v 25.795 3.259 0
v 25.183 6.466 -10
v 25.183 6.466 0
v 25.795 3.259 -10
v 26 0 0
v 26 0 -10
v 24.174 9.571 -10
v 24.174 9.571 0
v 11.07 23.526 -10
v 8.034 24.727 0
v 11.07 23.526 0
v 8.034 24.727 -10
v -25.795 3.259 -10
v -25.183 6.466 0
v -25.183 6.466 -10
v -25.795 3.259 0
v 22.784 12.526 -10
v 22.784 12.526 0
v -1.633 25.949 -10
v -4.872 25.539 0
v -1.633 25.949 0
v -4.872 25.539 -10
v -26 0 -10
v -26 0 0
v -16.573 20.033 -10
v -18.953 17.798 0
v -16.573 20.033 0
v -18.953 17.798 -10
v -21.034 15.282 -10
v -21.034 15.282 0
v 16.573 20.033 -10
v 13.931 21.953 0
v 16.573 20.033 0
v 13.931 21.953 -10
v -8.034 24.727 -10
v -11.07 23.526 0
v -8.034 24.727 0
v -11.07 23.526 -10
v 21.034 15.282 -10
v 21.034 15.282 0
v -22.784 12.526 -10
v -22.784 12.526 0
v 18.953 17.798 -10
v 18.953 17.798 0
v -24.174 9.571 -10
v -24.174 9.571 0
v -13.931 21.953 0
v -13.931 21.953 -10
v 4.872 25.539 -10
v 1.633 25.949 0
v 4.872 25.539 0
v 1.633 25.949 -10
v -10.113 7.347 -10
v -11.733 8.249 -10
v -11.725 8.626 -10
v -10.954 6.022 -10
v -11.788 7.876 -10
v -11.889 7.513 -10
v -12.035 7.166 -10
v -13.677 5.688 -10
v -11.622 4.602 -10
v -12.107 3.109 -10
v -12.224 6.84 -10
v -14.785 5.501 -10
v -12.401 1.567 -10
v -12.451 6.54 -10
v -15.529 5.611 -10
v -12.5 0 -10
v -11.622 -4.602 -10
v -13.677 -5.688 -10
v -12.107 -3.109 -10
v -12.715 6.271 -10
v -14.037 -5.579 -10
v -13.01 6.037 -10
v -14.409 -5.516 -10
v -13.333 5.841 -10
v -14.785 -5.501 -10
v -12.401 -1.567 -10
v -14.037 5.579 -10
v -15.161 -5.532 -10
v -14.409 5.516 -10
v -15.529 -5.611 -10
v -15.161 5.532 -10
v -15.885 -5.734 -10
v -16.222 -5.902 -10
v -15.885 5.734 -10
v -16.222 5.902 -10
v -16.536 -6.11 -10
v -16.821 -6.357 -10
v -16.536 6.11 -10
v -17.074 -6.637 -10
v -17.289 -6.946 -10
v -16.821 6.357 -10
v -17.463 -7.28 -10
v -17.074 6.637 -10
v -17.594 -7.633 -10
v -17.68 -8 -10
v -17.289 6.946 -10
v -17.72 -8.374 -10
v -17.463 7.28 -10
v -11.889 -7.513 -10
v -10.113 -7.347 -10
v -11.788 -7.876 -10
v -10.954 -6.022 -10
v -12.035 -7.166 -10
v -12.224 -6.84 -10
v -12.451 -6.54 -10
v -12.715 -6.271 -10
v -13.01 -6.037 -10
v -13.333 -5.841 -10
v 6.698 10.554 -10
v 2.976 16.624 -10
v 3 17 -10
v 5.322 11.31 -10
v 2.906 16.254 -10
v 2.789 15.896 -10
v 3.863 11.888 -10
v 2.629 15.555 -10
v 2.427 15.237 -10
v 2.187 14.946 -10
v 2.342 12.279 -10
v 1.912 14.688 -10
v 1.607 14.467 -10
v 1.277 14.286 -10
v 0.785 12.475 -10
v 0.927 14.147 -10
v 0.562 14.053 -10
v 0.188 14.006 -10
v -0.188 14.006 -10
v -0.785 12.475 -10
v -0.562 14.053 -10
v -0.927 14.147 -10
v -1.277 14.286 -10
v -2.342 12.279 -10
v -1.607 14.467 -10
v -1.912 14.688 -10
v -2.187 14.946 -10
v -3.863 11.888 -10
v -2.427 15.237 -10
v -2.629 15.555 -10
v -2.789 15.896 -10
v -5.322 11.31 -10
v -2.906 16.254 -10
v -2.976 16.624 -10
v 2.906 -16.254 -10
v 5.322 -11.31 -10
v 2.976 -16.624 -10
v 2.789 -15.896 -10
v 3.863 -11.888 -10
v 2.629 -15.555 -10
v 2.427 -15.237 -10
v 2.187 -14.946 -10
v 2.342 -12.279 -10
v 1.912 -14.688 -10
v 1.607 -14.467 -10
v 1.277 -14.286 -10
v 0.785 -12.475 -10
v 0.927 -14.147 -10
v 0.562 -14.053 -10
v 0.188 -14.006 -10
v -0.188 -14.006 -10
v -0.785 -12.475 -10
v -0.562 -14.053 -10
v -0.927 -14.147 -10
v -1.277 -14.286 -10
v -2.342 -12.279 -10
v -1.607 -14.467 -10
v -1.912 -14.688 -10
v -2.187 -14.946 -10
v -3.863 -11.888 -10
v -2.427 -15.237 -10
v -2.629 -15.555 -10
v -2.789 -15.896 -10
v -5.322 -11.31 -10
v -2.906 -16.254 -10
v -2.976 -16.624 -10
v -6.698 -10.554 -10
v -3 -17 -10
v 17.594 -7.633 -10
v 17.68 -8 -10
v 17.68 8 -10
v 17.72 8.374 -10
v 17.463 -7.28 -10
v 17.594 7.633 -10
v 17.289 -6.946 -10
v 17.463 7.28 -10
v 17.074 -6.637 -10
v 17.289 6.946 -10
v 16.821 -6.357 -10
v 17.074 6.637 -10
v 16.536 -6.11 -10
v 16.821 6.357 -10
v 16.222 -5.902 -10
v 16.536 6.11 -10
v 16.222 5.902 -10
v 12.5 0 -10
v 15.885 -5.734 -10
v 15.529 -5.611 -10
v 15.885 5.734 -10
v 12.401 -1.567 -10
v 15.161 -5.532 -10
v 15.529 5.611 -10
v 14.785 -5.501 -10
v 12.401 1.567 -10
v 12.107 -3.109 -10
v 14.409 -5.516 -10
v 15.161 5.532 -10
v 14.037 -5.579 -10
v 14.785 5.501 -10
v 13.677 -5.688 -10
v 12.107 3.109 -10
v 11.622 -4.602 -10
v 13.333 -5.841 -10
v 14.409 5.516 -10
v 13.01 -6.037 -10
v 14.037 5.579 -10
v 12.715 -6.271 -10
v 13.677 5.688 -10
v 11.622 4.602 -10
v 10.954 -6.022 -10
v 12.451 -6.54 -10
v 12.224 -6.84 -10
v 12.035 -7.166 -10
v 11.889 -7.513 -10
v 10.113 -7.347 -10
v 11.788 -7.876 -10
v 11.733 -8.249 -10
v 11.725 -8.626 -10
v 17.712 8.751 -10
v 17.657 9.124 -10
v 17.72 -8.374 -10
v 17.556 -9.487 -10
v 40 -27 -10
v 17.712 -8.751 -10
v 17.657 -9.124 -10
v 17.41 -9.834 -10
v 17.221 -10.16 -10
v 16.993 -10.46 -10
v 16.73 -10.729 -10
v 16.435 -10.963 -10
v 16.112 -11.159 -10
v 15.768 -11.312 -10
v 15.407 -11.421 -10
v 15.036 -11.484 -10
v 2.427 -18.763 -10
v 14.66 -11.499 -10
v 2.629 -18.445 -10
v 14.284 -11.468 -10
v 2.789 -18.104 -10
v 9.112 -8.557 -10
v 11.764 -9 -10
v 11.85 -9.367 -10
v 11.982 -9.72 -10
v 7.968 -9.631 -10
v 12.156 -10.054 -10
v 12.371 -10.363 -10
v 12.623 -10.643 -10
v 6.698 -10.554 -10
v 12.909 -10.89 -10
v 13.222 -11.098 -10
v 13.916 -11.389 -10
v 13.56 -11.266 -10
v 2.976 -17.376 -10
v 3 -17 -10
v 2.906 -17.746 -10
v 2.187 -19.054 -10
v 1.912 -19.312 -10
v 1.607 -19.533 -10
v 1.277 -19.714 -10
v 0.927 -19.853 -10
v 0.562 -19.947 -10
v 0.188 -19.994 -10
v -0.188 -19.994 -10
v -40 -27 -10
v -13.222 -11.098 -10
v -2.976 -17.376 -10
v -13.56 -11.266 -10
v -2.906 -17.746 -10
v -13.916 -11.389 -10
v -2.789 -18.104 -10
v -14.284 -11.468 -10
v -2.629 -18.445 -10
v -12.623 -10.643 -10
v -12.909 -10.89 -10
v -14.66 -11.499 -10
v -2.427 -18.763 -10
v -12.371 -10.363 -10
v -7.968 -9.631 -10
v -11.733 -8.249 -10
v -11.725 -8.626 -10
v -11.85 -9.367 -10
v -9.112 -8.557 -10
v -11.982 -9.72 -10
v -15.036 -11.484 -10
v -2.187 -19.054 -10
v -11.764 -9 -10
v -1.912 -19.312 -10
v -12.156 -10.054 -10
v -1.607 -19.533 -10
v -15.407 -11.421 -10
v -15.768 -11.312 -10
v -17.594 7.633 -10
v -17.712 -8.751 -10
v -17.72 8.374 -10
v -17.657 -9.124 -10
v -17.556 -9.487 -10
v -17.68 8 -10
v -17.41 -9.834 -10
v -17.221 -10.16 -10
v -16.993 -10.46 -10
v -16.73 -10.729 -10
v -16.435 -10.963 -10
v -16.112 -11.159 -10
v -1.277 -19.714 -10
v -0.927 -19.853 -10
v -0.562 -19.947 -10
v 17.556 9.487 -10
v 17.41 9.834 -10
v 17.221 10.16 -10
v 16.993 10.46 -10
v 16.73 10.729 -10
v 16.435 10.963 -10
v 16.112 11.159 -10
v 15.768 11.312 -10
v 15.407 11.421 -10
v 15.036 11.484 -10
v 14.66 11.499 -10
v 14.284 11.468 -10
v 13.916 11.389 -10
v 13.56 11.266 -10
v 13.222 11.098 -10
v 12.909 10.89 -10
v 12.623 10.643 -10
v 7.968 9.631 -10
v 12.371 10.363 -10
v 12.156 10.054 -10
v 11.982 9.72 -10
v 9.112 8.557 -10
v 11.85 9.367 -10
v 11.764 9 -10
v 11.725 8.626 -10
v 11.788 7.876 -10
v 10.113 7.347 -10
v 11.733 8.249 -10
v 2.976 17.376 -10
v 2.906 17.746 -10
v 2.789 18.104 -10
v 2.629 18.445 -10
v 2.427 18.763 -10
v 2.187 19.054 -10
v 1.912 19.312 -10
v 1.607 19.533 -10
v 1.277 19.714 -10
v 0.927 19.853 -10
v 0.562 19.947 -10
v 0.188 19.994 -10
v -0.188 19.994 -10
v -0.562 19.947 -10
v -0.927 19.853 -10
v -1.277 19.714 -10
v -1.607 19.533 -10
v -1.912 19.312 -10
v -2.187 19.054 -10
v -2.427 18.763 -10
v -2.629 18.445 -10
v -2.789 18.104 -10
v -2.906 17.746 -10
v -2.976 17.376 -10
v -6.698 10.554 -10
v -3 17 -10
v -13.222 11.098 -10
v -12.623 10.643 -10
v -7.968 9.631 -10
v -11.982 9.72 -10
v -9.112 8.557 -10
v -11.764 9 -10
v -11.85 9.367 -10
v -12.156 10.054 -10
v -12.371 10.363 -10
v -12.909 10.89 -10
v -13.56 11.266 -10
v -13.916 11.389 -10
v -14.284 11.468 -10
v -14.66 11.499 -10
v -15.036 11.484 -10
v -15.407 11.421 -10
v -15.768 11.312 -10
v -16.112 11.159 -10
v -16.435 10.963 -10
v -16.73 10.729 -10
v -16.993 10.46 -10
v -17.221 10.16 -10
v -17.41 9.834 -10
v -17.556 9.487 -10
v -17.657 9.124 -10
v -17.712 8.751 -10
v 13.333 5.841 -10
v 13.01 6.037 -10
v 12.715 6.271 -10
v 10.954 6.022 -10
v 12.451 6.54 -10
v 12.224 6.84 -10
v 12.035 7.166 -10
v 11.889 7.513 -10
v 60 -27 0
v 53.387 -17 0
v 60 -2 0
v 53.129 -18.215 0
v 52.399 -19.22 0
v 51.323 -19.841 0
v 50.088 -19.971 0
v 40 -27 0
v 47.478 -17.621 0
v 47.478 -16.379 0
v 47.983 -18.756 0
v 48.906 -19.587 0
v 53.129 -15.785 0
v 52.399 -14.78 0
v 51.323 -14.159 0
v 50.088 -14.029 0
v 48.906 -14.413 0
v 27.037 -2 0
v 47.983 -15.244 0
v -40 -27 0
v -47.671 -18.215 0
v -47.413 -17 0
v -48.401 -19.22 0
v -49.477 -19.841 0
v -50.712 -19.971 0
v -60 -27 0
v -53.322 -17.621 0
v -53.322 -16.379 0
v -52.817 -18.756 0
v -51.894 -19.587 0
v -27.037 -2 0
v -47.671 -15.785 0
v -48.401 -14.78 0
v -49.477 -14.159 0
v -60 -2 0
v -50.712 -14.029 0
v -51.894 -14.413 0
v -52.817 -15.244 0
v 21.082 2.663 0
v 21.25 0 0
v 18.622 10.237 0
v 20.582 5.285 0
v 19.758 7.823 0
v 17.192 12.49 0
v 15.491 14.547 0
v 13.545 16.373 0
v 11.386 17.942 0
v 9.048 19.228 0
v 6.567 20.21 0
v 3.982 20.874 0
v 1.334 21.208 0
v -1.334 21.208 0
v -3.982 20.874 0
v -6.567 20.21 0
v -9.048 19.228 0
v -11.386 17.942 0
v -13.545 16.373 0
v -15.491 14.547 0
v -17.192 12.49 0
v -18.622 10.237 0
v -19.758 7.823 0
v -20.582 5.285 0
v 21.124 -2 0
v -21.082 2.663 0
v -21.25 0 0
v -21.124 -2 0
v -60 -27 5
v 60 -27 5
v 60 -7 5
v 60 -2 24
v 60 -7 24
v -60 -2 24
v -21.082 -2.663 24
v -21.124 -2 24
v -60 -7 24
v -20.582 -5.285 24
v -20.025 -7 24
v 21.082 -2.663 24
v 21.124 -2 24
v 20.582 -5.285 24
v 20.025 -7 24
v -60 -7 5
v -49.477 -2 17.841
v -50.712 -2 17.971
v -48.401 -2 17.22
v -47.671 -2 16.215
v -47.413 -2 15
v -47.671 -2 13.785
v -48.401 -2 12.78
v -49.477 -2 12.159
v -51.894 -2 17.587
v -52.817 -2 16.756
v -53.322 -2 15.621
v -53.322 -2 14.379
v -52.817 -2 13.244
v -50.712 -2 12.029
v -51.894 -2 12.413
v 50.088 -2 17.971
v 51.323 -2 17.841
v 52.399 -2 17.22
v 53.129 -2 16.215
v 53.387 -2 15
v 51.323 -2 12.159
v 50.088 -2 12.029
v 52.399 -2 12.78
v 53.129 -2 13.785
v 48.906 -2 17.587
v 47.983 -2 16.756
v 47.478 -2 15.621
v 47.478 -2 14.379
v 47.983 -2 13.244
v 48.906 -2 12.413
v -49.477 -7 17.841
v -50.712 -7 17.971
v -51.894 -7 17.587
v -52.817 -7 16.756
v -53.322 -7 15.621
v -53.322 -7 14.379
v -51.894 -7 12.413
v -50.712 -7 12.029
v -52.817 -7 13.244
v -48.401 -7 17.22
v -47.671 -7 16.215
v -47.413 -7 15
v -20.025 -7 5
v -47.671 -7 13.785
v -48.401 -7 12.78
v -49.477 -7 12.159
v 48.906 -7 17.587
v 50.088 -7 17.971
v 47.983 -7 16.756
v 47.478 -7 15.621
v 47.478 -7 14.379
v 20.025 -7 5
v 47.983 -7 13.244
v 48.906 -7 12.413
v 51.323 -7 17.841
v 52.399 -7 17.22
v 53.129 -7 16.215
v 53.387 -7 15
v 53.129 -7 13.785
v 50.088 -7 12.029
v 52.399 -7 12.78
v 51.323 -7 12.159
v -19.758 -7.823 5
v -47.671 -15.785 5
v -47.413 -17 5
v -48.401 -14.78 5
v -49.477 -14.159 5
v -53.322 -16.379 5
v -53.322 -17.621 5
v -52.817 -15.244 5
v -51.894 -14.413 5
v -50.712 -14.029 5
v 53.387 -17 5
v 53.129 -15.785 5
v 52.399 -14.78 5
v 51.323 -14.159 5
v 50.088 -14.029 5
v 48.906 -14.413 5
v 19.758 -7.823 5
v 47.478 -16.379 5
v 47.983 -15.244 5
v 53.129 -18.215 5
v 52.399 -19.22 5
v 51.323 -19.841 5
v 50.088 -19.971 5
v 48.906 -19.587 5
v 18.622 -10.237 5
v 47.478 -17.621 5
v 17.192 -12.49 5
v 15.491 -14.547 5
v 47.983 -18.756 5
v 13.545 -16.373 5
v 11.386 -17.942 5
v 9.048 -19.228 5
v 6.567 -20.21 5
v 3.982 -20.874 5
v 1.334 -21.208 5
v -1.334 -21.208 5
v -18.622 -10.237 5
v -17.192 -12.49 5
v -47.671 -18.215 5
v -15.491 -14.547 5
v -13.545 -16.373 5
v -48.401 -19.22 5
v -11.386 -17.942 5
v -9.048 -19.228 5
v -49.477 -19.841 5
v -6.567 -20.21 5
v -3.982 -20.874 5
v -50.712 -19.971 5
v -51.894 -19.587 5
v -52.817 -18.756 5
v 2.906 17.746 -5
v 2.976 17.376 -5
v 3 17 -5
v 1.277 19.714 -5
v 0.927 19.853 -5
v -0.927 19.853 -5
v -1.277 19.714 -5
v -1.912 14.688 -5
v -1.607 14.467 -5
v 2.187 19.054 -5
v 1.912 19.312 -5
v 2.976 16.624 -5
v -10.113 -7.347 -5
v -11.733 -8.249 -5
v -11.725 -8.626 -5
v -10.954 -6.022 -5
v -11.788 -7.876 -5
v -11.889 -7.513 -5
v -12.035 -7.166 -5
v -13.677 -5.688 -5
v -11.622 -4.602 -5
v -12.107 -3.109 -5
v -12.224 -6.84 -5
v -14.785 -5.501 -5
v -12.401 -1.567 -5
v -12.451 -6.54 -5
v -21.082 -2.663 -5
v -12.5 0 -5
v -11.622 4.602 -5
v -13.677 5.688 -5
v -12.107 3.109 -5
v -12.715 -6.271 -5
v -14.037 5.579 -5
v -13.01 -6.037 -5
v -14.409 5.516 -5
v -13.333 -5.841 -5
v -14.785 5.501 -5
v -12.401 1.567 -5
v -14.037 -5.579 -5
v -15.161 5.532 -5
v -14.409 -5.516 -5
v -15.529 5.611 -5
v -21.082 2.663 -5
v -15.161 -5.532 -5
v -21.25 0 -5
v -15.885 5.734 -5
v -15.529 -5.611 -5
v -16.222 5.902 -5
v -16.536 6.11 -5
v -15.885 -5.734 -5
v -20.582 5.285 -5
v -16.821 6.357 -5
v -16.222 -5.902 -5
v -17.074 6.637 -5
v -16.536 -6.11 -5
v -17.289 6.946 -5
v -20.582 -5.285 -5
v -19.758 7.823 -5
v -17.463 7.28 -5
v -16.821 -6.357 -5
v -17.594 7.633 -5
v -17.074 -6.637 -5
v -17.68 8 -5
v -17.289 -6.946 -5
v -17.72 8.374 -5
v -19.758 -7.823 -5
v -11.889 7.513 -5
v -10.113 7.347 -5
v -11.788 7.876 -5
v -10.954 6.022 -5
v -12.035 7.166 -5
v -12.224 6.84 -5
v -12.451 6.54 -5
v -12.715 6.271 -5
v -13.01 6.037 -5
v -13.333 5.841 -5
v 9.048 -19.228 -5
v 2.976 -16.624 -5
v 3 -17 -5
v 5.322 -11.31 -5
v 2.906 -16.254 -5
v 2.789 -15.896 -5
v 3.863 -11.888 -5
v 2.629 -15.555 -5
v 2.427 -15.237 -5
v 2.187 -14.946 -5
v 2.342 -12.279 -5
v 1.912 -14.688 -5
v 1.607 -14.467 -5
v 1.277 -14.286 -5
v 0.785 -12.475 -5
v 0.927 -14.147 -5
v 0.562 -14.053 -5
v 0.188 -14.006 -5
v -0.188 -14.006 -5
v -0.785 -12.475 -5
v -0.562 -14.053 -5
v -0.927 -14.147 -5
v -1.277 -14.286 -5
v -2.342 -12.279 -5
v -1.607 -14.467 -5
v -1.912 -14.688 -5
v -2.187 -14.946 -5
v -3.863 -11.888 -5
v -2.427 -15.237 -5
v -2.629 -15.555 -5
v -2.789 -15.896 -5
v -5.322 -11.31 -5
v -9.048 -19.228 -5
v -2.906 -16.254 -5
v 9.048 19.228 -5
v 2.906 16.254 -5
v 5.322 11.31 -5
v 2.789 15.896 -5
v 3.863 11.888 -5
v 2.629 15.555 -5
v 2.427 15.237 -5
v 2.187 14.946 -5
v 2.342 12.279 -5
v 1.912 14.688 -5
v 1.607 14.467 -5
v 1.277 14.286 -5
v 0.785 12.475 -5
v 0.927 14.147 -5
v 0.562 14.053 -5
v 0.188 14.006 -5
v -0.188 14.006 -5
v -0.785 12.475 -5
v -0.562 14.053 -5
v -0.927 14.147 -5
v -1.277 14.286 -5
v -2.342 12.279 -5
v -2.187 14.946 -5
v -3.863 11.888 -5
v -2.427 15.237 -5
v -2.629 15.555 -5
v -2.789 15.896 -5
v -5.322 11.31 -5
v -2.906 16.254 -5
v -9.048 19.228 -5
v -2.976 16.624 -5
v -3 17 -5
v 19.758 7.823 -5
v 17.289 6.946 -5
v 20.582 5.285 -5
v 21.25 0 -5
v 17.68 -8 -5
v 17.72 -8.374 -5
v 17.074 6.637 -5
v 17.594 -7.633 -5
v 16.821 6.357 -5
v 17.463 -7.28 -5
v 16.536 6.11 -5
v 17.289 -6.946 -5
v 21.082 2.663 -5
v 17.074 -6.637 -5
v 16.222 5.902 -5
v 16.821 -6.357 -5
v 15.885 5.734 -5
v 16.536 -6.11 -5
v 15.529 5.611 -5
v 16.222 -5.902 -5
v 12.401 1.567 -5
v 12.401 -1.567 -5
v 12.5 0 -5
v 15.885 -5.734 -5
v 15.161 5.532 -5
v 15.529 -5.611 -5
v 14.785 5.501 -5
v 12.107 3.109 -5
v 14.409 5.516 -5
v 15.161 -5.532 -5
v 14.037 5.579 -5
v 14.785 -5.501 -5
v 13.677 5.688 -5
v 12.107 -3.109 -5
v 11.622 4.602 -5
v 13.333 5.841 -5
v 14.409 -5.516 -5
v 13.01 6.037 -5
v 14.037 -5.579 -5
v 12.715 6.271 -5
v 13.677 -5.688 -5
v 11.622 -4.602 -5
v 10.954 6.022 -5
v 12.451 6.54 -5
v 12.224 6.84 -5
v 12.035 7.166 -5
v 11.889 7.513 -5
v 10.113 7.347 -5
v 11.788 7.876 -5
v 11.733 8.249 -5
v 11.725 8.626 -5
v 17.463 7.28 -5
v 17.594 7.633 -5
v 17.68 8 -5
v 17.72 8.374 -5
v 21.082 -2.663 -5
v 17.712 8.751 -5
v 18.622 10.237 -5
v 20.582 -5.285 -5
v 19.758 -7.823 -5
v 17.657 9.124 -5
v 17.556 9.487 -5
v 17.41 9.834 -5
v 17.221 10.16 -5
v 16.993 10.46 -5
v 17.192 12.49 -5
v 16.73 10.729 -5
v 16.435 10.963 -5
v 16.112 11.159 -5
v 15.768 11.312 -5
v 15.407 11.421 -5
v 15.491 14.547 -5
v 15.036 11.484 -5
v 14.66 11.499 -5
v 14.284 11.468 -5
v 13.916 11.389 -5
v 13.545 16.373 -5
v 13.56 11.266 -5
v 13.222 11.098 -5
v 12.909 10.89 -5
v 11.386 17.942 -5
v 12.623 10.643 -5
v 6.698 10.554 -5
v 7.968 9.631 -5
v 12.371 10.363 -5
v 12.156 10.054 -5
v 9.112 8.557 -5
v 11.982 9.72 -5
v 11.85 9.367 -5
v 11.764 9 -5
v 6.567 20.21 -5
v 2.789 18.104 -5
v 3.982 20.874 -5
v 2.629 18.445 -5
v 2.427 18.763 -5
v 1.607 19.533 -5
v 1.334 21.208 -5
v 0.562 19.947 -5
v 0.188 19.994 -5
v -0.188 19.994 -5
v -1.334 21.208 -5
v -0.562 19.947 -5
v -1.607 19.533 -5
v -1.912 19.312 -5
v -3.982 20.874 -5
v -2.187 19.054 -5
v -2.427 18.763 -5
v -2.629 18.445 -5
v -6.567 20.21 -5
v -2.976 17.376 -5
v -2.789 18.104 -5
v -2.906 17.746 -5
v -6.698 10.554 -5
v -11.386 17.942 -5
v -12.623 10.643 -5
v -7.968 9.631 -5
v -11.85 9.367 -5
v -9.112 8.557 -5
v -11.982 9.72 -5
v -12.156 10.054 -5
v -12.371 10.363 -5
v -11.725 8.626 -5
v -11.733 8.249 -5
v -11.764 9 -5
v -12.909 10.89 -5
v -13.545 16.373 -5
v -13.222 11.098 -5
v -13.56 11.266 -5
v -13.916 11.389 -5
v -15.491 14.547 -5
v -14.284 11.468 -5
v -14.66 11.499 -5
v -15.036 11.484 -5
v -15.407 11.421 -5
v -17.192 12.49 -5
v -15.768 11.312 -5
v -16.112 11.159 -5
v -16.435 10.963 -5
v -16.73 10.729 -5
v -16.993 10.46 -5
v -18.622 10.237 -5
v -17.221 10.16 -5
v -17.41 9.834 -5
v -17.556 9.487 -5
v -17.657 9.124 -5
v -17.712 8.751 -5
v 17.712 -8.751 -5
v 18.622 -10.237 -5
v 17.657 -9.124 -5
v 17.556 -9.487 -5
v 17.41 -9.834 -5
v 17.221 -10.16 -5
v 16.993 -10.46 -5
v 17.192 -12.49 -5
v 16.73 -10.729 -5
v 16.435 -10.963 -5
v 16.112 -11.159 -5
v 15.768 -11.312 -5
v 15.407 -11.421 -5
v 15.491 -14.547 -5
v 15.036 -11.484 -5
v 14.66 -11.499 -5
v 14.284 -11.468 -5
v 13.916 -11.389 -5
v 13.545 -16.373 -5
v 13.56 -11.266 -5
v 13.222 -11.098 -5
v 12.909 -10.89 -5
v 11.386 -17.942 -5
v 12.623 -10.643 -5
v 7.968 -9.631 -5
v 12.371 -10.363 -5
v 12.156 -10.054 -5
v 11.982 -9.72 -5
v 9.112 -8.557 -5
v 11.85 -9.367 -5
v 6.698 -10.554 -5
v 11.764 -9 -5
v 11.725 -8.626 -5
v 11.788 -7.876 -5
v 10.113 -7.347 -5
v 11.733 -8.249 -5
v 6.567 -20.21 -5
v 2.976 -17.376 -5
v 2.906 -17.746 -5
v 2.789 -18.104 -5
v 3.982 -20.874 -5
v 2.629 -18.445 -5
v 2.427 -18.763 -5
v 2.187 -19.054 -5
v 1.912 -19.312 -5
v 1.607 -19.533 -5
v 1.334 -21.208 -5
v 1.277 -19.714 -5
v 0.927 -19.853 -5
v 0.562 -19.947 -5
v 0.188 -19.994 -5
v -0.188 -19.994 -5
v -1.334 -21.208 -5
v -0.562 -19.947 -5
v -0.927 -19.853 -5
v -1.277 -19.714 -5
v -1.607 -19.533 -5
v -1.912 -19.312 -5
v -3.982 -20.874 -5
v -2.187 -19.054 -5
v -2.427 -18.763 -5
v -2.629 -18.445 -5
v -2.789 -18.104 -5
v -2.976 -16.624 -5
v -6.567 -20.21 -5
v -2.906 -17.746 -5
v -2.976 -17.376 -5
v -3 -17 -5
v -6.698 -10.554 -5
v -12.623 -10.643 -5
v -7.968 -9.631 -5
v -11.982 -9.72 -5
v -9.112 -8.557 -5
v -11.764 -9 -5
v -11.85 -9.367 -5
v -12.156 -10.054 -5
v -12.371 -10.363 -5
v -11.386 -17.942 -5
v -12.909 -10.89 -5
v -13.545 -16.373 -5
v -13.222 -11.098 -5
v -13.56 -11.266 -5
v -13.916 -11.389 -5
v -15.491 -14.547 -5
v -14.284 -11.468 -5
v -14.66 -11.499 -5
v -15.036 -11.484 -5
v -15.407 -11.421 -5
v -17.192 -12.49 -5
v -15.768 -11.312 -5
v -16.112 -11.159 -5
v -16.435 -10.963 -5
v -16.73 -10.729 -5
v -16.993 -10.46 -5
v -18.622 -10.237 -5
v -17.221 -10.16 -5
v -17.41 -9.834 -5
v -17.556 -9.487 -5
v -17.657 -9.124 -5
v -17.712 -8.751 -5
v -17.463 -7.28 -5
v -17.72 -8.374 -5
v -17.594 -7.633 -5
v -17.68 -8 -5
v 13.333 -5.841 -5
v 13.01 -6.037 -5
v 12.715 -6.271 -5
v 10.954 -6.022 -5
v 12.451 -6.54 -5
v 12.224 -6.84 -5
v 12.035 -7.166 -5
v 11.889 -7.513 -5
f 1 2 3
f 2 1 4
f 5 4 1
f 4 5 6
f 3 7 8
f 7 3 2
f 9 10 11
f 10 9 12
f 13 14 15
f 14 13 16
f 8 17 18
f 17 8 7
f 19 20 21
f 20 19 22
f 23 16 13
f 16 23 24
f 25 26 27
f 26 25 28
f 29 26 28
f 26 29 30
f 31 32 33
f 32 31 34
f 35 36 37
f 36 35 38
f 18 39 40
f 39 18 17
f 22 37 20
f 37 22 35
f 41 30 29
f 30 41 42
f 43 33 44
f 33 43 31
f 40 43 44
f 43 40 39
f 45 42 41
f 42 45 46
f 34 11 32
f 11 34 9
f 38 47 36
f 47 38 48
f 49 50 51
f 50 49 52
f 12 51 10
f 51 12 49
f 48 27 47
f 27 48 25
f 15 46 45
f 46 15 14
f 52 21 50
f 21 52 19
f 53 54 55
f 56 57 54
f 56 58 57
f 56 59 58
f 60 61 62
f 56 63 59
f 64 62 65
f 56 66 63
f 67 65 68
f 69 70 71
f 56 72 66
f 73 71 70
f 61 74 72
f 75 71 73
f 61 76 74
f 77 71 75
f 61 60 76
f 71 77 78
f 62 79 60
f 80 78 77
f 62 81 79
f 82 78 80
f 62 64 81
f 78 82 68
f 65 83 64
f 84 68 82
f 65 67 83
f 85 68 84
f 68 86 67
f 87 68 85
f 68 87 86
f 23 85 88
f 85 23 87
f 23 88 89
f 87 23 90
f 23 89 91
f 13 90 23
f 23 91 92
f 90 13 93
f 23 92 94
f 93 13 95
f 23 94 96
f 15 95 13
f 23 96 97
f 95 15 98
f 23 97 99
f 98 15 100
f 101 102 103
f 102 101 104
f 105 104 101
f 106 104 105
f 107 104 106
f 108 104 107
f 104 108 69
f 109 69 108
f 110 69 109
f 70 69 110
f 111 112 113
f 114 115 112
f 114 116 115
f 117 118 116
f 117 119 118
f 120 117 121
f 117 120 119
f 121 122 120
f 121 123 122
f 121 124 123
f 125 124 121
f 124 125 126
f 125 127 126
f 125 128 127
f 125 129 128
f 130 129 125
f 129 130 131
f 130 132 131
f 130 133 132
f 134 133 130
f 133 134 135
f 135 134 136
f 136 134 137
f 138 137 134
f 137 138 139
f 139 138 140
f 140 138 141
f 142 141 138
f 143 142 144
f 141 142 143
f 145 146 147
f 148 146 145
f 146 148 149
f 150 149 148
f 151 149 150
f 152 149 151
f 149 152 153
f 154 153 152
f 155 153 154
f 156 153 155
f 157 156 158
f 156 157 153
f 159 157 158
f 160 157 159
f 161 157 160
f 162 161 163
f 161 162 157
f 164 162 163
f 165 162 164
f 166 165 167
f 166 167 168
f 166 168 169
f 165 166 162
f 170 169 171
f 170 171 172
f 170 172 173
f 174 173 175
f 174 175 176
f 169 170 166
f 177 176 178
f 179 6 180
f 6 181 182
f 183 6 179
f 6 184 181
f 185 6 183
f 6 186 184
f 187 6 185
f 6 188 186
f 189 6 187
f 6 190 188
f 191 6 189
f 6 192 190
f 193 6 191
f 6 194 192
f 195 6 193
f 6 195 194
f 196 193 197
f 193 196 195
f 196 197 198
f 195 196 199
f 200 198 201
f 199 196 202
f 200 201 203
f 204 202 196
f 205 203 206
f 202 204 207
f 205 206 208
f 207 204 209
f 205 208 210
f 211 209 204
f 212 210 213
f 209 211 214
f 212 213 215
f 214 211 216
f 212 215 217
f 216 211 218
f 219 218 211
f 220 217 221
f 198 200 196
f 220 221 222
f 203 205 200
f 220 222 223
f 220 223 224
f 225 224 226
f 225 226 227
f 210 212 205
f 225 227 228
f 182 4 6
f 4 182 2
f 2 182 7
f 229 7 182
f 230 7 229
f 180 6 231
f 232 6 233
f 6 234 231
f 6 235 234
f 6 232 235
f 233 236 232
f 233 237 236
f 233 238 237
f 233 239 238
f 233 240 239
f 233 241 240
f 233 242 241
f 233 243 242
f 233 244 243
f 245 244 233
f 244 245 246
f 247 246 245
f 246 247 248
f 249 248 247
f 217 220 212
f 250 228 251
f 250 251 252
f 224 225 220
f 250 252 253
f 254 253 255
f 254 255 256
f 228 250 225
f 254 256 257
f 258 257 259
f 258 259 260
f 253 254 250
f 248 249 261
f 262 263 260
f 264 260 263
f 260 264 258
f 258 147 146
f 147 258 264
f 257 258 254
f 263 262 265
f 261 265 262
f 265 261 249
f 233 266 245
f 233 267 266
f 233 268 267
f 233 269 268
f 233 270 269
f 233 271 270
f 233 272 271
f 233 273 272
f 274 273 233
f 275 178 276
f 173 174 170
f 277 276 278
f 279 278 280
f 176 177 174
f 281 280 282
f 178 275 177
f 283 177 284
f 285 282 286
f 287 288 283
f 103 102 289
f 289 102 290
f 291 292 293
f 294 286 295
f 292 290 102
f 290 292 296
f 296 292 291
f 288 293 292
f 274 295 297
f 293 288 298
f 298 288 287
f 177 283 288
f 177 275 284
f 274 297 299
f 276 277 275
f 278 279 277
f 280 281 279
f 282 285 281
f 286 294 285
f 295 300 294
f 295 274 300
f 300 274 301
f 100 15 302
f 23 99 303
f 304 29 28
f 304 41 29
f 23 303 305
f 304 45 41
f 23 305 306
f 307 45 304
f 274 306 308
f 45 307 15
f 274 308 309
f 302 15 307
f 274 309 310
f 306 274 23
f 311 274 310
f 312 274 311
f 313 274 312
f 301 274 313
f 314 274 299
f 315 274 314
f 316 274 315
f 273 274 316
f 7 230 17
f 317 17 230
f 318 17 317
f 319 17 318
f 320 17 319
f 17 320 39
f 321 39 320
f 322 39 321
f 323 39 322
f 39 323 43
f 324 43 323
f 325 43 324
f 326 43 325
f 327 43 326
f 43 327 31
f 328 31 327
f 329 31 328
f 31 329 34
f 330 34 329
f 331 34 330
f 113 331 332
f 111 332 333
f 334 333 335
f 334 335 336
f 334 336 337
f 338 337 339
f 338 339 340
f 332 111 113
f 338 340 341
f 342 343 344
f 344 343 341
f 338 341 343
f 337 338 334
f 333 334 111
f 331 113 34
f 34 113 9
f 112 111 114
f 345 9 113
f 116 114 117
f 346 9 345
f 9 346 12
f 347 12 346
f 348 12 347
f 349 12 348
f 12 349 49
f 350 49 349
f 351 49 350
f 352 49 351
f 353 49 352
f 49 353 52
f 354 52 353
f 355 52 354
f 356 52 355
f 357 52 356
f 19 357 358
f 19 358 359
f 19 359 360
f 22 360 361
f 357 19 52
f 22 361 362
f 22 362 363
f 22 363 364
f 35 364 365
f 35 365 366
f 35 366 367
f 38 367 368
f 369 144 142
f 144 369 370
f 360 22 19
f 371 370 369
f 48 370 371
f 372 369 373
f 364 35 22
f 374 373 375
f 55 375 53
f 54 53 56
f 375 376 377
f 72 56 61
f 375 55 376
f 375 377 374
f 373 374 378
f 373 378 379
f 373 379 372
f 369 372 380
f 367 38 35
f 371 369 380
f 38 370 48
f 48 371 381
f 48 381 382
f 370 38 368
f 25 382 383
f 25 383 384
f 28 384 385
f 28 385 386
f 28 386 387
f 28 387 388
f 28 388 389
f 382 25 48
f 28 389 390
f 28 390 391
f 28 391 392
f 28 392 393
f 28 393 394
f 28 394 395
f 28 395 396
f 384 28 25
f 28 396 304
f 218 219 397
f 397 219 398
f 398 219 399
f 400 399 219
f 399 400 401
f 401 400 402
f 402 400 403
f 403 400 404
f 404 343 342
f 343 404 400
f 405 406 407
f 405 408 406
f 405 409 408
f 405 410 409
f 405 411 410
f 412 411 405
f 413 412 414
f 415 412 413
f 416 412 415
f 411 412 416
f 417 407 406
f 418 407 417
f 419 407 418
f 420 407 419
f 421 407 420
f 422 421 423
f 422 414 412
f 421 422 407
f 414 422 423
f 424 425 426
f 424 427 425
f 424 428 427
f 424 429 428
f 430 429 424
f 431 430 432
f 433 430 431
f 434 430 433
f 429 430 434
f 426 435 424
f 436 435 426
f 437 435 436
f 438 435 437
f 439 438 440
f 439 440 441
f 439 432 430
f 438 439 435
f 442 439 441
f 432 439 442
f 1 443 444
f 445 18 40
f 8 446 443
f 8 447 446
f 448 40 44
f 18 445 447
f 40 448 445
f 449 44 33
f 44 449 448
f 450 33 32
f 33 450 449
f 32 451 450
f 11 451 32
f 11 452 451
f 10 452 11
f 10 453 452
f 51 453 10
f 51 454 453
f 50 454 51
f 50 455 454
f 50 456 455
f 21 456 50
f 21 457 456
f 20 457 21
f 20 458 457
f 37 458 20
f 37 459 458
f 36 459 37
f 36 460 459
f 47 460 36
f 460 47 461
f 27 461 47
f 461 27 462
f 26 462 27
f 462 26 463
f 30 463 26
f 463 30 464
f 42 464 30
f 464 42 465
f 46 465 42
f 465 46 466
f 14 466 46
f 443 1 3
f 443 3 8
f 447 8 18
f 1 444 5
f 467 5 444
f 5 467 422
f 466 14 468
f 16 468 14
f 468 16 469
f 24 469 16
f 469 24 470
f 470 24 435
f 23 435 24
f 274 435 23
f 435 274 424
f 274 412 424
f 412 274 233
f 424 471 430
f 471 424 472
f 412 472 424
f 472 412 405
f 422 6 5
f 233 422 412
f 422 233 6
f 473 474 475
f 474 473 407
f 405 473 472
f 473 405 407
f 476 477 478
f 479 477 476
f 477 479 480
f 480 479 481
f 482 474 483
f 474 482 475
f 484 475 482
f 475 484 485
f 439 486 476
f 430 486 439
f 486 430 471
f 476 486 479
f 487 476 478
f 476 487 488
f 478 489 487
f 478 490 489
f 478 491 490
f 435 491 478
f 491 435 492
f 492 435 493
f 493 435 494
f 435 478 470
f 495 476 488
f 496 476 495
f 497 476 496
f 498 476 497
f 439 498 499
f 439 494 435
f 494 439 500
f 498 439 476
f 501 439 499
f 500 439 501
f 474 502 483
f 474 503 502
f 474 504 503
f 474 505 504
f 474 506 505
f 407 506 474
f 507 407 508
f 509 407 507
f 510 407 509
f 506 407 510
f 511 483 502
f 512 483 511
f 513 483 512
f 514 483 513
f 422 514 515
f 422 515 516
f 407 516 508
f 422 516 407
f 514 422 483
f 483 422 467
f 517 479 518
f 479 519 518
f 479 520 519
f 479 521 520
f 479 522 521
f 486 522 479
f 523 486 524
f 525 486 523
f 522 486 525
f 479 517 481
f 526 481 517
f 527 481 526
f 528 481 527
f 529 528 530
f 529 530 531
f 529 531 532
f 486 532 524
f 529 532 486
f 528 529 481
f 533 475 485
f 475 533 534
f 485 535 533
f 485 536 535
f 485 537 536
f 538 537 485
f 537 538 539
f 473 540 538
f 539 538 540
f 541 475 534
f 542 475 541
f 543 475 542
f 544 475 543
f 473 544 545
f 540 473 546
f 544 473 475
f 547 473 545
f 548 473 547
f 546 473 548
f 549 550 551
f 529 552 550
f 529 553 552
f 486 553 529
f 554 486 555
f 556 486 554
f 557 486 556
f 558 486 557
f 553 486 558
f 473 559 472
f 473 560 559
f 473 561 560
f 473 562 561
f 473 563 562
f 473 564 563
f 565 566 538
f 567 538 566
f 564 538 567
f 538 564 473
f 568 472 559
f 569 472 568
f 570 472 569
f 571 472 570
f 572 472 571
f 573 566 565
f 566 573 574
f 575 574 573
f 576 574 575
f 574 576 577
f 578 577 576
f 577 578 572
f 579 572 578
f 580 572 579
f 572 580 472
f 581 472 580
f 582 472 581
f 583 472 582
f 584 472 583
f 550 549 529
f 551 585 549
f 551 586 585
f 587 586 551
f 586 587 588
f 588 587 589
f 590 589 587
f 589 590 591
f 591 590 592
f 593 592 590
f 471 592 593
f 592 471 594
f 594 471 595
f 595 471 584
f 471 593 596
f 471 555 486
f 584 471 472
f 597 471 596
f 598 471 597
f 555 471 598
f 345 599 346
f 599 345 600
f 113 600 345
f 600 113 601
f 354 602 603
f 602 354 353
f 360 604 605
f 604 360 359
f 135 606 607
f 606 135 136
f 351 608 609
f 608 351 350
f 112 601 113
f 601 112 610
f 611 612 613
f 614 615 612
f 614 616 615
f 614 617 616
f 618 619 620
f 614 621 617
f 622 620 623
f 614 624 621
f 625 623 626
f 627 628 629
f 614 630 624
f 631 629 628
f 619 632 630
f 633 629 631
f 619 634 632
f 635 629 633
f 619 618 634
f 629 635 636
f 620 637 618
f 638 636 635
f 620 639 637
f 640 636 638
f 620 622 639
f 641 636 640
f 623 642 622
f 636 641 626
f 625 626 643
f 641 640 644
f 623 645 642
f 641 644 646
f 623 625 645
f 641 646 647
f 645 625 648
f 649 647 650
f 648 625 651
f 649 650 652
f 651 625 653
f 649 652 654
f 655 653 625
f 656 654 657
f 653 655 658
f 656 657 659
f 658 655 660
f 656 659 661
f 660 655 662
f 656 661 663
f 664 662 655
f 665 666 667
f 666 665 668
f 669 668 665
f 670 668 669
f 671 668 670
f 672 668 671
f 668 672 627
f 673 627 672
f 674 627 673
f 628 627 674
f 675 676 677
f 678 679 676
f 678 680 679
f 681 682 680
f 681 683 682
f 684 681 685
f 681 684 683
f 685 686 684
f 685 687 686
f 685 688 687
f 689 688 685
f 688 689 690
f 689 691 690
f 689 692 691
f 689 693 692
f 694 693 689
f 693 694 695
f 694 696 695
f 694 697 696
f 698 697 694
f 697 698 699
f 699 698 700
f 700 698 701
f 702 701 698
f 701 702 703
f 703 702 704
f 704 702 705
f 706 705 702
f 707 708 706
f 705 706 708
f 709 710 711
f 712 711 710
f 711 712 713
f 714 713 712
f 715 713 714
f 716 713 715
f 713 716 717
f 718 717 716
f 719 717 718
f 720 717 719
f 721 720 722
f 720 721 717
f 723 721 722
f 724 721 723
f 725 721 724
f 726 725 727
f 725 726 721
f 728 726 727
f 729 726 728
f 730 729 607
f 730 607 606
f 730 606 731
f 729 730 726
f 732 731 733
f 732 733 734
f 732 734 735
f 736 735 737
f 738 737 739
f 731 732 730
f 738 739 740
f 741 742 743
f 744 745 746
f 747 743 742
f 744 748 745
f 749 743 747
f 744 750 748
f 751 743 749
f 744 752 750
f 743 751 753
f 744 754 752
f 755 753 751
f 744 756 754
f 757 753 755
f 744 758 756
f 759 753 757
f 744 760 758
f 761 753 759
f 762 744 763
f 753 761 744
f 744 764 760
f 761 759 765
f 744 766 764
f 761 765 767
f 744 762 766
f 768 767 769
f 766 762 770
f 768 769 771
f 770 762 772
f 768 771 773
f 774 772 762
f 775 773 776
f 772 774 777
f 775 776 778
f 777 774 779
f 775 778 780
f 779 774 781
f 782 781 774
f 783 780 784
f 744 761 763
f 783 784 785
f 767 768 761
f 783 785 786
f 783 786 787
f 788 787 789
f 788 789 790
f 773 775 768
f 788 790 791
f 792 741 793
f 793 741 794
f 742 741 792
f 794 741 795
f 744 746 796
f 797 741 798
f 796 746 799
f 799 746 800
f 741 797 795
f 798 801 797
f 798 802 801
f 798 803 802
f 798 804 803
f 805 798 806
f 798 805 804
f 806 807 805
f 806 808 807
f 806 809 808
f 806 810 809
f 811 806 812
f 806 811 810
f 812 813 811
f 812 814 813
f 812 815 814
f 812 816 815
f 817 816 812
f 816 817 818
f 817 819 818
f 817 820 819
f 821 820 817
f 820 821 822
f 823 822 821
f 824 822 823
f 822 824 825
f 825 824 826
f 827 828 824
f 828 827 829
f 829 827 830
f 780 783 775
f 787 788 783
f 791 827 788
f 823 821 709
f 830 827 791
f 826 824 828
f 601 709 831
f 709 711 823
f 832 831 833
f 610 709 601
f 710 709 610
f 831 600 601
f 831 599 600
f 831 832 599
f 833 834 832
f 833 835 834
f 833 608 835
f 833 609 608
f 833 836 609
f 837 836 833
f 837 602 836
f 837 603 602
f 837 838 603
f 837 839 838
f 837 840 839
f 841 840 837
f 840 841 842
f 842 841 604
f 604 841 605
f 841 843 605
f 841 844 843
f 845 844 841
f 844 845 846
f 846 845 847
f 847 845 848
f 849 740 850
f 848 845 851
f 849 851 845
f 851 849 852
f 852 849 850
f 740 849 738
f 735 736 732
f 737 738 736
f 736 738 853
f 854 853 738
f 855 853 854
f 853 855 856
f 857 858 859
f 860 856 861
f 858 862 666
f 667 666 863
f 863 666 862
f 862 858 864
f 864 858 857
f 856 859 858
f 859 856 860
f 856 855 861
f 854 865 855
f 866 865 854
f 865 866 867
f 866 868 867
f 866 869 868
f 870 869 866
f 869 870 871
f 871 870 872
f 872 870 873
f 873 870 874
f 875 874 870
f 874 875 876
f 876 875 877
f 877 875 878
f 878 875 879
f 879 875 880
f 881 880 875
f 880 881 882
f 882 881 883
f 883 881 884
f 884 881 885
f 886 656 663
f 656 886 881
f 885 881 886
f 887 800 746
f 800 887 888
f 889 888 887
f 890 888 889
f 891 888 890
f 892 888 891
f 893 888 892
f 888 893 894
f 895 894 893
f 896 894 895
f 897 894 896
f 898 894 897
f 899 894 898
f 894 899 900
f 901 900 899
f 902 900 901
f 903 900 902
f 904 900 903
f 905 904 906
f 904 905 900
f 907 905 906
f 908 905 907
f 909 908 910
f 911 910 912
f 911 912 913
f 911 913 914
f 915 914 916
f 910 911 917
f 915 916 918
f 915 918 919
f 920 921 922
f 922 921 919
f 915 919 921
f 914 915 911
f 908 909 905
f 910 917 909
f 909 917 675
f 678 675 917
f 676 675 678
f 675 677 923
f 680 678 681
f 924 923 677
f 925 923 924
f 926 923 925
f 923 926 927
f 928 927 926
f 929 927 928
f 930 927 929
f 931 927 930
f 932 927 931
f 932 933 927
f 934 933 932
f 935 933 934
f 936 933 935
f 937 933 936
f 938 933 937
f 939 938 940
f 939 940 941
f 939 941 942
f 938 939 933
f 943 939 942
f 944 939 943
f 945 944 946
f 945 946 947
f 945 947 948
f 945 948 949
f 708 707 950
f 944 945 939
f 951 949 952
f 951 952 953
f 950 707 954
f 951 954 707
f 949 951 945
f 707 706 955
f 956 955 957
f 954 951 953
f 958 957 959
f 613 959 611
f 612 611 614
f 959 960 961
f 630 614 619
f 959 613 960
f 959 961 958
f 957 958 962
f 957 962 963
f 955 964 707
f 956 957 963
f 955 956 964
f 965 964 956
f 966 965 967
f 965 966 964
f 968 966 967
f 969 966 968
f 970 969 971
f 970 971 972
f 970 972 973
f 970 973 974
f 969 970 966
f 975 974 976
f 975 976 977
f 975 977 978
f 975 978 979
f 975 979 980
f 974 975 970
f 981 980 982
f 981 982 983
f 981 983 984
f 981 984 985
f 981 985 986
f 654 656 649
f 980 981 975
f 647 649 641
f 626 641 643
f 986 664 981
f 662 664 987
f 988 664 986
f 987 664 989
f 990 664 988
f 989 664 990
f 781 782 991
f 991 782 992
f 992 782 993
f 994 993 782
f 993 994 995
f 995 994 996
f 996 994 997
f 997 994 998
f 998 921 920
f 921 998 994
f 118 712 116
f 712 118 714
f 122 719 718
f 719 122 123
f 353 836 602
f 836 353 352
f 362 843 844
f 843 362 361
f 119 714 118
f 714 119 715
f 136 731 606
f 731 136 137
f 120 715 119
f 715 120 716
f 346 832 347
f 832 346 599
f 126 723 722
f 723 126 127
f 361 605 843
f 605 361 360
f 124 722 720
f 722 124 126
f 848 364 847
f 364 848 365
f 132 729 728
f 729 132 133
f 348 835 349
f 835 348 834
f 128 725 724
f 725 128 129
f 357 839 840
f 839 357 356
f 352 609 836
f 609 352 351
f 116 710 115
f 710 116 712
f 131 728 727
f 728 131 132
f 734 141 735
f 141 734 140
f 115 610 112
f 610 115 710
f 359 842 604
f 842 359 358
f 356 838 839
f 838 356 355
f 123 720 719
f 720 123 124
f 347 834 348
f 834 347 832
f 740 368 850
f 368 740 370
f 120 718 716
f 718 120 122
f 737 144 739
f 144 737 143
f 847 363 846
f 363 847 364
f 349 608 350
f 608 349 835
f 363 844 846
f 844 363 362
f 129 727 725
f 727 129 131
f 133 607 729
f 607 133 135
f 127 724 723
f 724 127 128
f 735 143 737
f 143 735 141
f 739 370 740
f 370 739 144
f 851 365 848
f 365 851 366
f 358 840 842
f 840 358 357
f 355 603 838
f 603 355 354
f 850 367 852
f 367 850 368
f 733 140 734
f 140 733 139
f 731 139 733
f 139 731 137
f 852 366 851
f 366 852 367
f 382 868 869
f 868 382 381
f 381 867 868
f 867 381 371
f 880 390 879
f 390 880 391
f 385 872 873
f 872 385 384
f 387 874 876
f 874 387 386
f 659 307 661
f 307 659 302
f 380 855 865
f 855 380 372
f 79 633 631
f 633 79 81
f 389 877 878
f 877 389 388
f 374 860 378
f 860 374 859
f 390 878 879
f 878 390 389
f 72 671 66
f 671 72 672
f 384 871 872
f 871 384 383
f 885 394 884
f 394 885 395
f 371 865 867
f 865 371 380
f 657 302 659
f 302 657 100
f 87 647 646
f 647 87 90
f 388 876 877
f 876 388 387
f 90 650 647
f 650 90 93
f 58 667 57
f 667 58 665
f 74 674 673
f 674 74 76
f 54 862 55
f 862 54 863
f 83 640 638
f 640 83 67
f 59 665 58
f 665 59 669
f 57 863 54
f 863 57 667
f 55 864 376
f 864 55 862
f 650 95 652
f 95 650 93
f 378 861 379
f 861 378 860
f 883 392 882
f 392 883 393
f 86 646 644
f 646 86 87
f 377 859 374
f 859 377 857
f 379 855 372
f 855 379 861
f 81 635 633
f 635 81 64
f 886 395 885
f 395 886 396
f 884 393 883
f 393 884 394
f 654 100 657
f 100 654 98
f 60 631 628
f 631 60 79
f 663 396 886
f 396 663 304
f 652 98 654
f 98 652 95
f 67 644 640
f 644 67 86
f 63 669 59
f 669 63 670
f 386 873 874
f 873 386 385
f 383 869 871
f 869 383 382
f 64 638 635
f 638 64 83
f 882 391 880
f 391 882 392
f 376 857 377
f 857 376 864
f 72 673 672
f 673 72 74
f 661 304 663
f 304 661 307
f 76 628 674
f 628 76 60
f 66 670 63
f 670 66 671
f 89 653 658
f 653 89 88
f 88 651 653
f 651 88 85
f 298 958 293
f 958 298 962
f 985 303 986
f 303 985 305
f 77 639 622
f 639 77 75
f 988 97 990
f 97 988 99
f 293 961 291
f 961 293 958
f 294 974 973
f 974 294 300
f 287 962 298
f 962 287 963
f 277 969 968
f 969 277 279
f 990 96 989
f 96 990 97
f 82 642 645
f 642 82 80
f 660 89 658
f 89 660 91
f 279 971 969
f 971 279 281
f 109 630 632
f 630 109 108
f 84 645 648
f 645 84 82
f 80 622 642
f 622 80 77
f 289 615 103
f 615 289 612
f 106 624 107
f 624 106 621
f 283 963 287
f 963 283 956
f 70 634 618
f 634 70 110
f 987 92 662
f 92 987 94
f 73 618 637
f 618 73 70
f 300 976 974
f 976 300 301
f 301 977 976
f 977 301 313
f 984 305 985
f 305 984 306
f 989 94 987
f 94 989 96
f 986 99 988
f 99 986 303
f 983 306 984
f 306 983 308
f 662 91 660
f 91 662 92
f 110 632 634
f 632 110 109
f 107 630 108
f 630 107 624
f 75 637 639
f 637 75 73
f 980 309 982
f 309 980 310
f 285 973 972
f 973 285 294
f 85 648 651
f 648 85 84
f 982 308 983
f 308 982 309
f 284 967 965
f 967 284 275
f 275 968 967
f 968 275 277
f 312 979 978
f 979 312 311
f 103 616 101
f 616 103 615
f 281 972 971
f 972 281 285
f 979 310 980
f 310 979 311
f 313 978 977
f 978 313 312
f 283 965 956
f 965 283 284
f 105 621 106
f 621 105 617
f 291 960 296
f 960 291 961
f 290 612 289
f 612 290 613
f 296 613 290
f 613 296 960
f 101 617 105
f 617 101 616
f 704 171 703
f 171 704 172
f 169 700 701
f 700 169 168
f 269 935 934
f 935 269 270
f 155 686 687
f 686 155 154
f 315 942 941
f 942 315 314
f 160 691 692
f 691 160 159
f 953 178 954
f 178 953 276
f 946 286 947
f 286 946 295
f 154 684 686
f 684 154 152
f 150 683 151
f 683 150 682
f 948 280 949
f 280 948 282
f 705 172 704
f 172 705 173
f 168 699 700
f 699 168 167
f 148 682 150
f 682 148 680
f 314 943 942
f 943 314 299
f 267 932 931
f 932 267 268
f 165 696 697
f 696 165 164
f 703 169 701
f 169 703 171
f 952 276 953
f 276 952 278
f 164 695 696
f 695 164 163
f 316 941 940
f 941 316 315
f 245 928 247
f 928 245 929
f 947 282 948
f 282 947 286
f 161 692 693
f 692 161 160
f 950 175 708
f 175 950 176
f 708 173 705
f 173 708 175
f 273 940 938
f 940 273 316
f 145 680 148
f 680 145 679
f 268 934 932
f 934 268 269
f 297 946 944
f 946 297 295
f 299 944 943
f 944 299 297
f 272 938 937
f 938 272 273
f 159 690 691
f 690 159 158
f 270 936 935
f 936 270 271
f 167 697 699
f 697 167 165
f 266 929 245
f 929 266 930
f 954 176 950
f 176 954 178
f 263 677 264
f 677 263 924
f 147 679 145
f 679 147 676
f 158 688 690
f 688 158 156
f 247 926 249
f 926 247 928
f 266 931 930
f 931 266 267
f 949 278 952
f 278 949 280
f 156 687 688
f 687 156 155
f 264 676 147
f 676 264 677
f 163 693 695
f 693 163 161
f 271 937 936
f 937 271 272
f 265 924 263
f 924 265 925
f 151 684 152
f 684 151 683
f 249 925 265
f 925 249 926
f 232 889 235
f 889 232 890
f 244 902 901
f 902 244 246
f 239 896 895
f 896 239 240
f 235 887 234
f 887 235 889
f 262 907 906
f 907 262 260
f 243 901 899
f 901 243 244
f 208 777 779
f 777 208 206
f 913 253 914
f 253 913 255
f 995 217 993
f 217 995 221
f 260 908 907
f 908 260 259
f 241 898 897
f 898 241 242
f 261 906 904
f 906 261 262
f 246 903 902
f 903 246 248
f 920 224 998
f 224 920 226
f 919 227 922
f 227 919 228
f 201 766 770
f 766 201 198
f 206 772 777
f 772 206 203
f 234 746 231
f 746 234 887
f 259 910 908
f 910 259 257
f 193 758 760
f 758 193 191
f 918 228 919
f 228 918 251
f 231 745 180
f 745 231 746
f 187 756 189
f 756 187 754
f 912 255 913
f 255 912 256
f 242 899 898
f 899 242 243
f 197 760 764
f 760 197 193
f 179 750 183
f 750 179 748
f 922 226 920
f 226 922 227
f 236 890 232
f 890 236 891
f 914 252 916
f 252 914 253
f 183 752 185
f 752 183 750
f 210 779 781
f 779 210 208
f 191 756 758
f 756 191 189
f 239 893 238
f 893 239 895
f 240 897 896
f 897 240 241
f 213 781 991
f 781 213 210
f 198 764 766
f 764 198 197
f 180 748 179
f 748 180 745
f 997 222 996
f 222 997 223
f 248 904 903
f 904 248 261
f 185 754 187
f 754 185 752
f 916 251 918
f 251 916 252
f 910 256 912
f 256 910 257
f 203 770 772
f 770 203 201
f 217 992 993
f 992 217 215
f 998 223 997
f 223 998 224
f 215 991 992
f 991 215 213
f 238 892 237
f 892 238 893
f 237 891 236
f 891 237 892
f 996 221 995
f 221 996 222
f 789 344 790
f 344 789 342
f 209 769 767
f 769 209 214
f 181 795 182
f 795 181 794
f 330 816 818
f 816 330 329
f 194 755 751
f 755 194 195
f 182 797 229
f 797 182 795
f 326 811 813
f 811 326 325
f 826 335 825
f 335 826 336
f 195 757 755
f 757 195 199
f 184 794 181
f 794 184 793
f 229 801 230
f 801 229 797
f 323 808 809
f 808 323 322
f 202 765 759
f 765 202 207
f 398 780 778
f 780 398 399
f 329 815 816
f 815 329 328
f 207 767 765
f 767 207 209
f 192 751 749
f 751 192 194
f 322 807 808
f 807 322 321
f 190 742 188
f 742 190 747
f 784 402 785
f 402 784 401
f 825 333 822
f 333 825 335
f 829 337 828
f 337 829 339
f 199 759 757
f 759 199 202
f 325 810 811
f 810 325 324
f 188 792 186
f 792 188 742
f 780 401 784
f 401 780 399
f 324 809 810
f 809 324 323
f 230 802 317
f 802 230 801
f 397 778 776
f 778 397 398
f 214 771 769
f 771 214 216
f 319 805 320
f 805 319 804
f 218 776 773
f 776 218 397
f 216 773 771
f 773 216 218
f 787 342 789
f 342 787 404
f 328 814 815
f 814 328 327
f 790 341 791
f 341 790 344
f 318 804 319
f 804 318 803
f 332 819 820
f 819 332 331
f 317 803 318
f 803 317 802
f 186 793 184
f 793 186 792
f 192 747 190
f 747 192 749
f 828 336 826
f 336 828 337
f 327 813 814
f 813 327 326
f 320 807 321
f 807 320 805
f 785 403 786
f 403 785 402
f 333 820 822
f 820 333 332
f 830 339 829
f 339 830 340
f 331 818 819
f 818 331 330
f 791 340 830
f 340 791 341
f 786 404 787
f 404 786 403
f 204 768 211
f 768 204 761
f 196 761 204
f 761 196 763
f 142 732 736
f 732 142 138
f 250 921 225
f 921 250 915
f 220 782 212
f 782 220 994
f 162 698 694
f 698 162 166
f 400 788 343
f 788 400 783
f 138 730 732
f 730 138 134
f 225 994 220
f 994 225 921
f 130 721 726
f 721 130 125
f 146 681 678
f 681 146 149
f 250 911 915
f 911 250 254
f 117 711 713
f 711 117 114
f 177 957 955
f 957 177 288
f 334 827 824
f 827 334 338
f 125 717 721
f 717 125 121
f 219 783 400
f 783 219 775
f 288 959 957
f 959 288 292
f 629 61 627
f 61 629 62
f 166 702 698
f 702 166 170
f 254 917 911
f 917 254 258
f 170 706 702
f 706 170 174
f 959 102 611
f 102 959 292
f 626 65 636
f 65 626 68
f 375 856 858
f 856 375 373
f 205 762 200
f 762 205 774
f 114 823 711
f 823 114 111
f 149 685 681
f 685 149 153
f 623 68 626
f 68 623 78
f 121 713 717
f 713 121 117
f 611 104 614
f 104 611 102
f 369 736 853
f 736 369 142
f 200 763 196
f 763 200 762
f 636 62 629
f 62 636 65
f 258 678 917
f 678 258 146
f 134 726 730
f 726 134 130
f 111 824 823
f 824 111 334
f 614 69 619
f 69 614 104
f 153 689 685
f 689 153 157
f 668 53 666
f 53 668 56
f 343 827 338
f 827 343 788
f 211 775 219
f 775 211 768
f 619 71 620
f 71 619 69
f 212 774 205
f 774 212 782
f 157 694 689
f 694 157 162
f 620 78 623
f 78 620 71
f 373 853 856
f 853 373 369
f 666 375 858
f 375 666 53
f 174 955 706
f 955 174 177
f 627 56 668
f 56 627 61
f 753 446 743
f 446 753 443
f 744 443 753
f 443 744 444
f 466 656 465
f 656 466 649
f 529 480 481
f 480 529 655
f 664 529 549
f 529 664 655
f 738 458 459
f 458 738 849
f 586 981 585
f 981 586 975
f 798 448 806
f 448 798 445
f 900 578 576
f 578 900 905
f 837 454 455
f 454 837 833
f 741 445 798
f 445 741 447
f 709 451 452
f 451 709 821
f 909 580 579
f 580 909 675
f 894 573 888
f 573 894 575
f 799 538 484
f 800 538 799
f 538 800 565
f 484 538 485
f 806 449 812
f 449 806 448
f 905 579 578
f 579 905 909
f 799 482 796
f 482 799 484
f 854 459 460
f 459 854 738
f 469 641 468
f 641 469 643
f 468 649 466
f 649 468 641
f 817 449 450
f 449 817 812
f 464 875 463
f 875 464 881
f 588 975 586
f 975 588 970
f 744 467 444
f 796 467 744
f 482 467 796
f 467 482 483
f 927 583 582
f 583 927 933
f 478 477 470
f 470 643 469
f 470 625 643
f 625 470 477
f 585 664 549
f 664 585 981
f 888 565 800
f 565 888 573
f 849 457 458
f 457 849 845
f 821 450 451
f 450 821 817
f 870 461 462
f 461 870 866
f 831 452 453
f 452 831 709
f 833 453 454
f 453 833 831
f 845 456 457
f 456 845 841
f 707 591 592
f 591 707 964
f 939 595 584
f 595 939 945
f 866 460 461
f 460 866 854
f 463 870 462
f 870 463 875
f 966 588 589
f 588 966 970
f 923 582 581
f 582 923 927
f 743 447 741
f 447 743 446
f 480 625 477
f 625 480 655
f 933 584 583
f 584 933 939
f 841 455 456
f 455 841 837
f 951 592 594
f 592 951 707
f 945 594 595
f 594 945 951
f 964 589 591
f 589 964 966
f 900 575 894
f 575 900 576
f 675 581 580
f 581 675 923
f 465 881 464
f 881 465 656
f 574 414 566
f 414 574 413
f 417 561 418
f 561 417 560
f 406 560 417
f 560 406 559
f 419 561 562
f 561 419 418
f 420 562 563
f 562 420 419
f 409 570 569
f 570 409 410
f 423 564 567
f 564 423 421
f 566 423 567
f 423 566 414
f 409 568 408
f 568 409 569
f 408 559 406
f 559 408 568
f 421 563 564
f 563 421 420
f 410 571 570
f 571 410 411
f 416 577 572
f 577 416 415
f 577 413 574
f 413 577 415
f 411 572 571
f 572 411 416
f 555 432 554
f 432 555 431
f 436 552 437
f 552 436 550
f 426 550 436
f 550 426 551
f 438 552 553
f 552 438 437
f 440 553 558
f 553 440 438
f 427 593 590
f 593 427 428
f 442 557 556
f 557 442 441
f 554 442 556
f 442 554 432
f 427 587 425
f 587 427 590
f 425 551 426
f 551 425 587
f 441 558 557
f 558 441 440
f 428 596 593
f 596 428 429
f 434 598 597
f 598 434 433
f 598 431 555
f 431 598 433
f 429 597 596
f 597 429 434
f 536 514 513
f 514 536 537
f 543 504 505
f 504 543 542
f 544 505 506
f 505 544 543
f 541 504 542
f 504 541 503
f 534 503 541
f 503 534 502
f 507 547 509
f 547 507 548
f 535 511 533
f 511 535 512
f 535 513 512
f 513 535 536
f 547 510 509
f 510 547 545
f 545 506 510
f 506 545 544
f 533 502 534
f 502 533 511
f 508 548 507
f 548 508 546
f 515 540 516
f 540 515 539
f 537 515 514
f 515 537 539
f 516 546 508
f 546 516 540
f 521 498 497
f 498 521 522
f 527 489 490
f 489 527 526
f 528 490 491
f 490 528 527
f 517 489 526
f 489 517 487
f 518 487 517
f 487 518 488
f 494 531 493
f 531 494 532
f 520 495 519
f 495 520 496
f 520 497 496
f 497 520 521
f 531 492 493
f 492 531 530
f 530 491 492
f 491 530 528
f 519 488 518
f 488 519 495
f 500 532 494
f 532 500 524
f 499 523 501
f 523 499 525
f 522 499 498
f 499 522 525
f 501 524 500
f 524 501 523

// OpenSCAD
// file: nuts_and_bolts.scad
// Copyright 2010 D1plo1d

// This library is dual licensed under the GPL 3.0 and the GNU Lesser General Public License as per http://creativecommons.org/licenses/LGPL/2.1/ .

//testNutsAndBolts();

module SKIPtestNutsAndBolts()
{
	$fn = 360;
	translate([0,15])nutHole(3);
	boltHole(3, length= 30);
}

MM = "mm";
INCH = "inch"; //Not yet supported

//Based on: http://www.roymech.co.uk/Useful_Tables/Screws/Hex_Screws.htm
METRIC_NUT_AC_WIDTHS =
[
	-1, //0 index is not used but reduces computation
	-1,
	-1,
	6.90,//m3
	8.10,//m4
	9.20,//m5
	11.50,//m6
	-1,
	15.50,//m8
	-1,
	19.60,//m10
	-1,
	22.10,//m12
	-1,
	-1,
	-1,
	27.70,//m16
	-1,
	-1,
	-1,
	34.60,//m20
	-1,
	-1,
	-1,
	41.60,//m24
	-1,
	-1,
	-1,
	-1,
	-1,
	53.1,//m30
	-1,
	-1,
	-1,
	-1,
	-1,
	63.5//m36
];
METRIC_NUT_THICKNESS =
[
	-1, //0 index is not used but reduces computation
	-1,
	-1,
	2.40,//m3
	3.20,//m4
	4.00,//m5
	5.00,//m6
	-1,
	6.50,//m8
	-1,
	8.00,//m10
	-1,
	10.00,//m12
	-1,
	-1,
	-1,
	13.00,//m16
	-1,
	-1,
	-1,
	16.00//m20
	-1,
	-1,
	-1,
	19.00,//m24
	-1,
	-1,
	-1,
	-1,
	-1,
	24.00,//m30
	-1,
	-1,
	-1,
	-1,
	-1,
	29.00//m36
];

COURSE_METRIC_BOLT_MAJOR_THREAD_DIAMETERS =
[//based on max values
	-1, //0 index is not used but reduces computation
	-1,
	-1,
	2.98,//m3
	3.978,//m4
	4.976,//m5
	5.974,//m6
	-1,
	7.972,//m8
	-1,
	9.968,//m10
	-1,
	11.966,//m12
	-1,
	-1,
	-1,
	15.962,//m16
	-1,
	-1,
	-1,
	19.958,//m20
	-1,
	-1,
	-1,
	23.952,//m24
	-1,
	-1,
	-1,
	-1,
	-1,
	29.947,//m30
	-1,
	-1,
	-1,
	-1,
	-1,
	35.940//m36
];

module nutHole(size, units=MM, tolerance = +0.0001, proj = -1)
{
	//takes a metric screw/nut size and looksup nut dimensions
	radius = METRIC_NUT_AC_WIDTHS[size]/2+tolerance;
	height = METRIC_NUT_THICKNESS[size]+tolerance;
	if (proj == -1)
	{
		cylinder(r= radius, h=height, $fn = 6, center=[0,0]);
	}
	if (proj == 1)
	{
		circle(r= radius, $fn = 6);
	}
	if (proj == 2)
	{
		translate([-radius/2, 0])
			square([radius*2, height]);
	}
}

module boltHole(size, units=MM, length, tolerance = +0.0001, proj = -1)
{
	radius = COURSE_METRIC_BOLT_MAJOR_THREAD_DIAMETERS[size]/2+tolerance;
//TODO: proper screw cap values
	capHeight = METRIC_NUT_THICKNESS[size]+tolerance; //METRIC_BOLT_CAP_HEIGHTS[size]+tolerance;
	capRadius = METRIC_NUT_AC_WIDTHS[size]/2+tolerance; //METRIC_BOLT_CAP_RADIUS[size]+tolerance;

	if (proj == -1)
	{
	translate([0, 0, -capHeight])
		cylinder(r= capRadius, h=capHeight, $fn=15);
	cylinder(r = radius, h = length, $fn=15);
	}
	if (proj == 1)
	{
		circle(r = radius);
	}
	if (proj == 2)
	{
		translate([-capRadius/2, -capHeight])
			square([capRadius*2, capHeight]);
		square([radius*2, length]);
	}
}

module boltHoleEx(size, units=MM, length, tolerance = +0.0001, shift_x=0, shift_y=0)
{
	radius = COURSE_METRIC_BOLT_MAJOR_THREAD_DIAMETERS[size]/2+tolerance;
//TODO: proper screw cap values
	capHeight = METRIC_NUT_THICKNESS[size]+tolerance; //METRIC_BOLT_CAP_HEIGHTS[size]+tolerance;
	capRadius = METRIC_NUT_AC_WIDTHS[size]/2+tolerance; //METRIC_BOLT_CAP_RADIUS[size]+tolerance;

	hull()
	{
		translate([0, 0, -capHeight]) cylinder(r= capRadius, h=capHeight, $fn=15);
		translate([shift_x, shift_y, -capHeight]) cylinder(r= capRadius, h=capHeight, $fn=15);
	}

	hull()
	{
		cylinder(r = radius, h = length, $fn=15);
		translate([shift_x, shift_y, 0]) cylinder(r = radius, h = length, $fn=15);
	}
}

//boltHoleEx(3, length=6);
// main file
include <nuts_and_bolts.scad>;
include <generals.scad>;

z_bed_carriage_depth = 27;
z_bed_carriage_width = 120;

flange_small = 25;
flange_big = 42;
flange_small_h = 25;
flange_big_h = 10;
flange_h = flange_big_h + flange_small_h;

module leadscrew_flange_hole(){
	color([0,1,1]) 
	{
		translate([0,0,-flange_small_h])
		cylinder(r = flange_small/2, h = flange_small_h+2);	

		translate([0,0,0])
		cylinder(r = flange_big/2+0.25, h = flange_big_h);	

		translate([0,0,0])
		{
		for ( i = [0 : 5] )
		{
		    rotate([0, 0, i * 360 / 6])
		    translate([0, 34/2, -3*wall])
		    cylinder(d=6, h=3*wall);
		}
		}		
	}
}

module z_bed_carriage()
{
	difference()
	{
		union()
		{
			translate([0, 0, -2*wall])
			cylinder(r = flange_big/2+wall, h = 2*wall);

			translate([0, 0, -2*wall])
			linear_extrude(2*wall)
			{
				polygon(points=[
					[-flange_big/2-wall,0],
					[+flange_big/2+wall,0],
					[z_bed_carriage_width/2-alu_x,-z_bed_carriage_depth],
					[-z_bed_carriage_width/2+alu_x,-z_bed_carriage_depth]]);
			}

			translate([-z_bed_carriage_width/2, -z_bed_carriage_depth+alu_x, 0]) cube([z_bed_carriage_width, wall, alu_x+wall-1]);

			translate([-z_bed_carriage_width/2, -z_bed_carriage_depth, 0]) cube([z_bed_carriage_width, alu_x+1, wall]);
		}

		translate([0, 0, -wall])
		leadscrew_flange_hole();
		
		cylinder(r = flange_big/2+0.25, h = 100);

		translate([z_bed_carriage_width/2 - M5_NUT/2-wall, -z_bed_carriage_depth + alu_x/2, wall-5.5]) boltHole(bolt, length = wall+1);

		translate([-z_bed_carriage_width/2 + M5_NUT/2+wall, -z_bed_carriage_depth + alu_x/2, wall-5.5]) boltHole(bolt, length = wall+1);

		translate([z_bed_carriage_width/2 - M5_NUT/2-wall, -z_bed_carriage_depth+alu_x+5.5, wall + alu_x/2]) rotate([90, 0, 0]) boltHole(bolt, length = wall+1);

		translate([-z_bed_carriage_width/2 + M5_NUT/2+wall, -z_bed_carriage_depth+alu_x+5.5, wall+alu_x/2]) rotate([90, 0, 0]) boltHole(bolt, length = wall+1);
	}

}

z_bed_carriage();
//cylinder(d=10, h=100);
